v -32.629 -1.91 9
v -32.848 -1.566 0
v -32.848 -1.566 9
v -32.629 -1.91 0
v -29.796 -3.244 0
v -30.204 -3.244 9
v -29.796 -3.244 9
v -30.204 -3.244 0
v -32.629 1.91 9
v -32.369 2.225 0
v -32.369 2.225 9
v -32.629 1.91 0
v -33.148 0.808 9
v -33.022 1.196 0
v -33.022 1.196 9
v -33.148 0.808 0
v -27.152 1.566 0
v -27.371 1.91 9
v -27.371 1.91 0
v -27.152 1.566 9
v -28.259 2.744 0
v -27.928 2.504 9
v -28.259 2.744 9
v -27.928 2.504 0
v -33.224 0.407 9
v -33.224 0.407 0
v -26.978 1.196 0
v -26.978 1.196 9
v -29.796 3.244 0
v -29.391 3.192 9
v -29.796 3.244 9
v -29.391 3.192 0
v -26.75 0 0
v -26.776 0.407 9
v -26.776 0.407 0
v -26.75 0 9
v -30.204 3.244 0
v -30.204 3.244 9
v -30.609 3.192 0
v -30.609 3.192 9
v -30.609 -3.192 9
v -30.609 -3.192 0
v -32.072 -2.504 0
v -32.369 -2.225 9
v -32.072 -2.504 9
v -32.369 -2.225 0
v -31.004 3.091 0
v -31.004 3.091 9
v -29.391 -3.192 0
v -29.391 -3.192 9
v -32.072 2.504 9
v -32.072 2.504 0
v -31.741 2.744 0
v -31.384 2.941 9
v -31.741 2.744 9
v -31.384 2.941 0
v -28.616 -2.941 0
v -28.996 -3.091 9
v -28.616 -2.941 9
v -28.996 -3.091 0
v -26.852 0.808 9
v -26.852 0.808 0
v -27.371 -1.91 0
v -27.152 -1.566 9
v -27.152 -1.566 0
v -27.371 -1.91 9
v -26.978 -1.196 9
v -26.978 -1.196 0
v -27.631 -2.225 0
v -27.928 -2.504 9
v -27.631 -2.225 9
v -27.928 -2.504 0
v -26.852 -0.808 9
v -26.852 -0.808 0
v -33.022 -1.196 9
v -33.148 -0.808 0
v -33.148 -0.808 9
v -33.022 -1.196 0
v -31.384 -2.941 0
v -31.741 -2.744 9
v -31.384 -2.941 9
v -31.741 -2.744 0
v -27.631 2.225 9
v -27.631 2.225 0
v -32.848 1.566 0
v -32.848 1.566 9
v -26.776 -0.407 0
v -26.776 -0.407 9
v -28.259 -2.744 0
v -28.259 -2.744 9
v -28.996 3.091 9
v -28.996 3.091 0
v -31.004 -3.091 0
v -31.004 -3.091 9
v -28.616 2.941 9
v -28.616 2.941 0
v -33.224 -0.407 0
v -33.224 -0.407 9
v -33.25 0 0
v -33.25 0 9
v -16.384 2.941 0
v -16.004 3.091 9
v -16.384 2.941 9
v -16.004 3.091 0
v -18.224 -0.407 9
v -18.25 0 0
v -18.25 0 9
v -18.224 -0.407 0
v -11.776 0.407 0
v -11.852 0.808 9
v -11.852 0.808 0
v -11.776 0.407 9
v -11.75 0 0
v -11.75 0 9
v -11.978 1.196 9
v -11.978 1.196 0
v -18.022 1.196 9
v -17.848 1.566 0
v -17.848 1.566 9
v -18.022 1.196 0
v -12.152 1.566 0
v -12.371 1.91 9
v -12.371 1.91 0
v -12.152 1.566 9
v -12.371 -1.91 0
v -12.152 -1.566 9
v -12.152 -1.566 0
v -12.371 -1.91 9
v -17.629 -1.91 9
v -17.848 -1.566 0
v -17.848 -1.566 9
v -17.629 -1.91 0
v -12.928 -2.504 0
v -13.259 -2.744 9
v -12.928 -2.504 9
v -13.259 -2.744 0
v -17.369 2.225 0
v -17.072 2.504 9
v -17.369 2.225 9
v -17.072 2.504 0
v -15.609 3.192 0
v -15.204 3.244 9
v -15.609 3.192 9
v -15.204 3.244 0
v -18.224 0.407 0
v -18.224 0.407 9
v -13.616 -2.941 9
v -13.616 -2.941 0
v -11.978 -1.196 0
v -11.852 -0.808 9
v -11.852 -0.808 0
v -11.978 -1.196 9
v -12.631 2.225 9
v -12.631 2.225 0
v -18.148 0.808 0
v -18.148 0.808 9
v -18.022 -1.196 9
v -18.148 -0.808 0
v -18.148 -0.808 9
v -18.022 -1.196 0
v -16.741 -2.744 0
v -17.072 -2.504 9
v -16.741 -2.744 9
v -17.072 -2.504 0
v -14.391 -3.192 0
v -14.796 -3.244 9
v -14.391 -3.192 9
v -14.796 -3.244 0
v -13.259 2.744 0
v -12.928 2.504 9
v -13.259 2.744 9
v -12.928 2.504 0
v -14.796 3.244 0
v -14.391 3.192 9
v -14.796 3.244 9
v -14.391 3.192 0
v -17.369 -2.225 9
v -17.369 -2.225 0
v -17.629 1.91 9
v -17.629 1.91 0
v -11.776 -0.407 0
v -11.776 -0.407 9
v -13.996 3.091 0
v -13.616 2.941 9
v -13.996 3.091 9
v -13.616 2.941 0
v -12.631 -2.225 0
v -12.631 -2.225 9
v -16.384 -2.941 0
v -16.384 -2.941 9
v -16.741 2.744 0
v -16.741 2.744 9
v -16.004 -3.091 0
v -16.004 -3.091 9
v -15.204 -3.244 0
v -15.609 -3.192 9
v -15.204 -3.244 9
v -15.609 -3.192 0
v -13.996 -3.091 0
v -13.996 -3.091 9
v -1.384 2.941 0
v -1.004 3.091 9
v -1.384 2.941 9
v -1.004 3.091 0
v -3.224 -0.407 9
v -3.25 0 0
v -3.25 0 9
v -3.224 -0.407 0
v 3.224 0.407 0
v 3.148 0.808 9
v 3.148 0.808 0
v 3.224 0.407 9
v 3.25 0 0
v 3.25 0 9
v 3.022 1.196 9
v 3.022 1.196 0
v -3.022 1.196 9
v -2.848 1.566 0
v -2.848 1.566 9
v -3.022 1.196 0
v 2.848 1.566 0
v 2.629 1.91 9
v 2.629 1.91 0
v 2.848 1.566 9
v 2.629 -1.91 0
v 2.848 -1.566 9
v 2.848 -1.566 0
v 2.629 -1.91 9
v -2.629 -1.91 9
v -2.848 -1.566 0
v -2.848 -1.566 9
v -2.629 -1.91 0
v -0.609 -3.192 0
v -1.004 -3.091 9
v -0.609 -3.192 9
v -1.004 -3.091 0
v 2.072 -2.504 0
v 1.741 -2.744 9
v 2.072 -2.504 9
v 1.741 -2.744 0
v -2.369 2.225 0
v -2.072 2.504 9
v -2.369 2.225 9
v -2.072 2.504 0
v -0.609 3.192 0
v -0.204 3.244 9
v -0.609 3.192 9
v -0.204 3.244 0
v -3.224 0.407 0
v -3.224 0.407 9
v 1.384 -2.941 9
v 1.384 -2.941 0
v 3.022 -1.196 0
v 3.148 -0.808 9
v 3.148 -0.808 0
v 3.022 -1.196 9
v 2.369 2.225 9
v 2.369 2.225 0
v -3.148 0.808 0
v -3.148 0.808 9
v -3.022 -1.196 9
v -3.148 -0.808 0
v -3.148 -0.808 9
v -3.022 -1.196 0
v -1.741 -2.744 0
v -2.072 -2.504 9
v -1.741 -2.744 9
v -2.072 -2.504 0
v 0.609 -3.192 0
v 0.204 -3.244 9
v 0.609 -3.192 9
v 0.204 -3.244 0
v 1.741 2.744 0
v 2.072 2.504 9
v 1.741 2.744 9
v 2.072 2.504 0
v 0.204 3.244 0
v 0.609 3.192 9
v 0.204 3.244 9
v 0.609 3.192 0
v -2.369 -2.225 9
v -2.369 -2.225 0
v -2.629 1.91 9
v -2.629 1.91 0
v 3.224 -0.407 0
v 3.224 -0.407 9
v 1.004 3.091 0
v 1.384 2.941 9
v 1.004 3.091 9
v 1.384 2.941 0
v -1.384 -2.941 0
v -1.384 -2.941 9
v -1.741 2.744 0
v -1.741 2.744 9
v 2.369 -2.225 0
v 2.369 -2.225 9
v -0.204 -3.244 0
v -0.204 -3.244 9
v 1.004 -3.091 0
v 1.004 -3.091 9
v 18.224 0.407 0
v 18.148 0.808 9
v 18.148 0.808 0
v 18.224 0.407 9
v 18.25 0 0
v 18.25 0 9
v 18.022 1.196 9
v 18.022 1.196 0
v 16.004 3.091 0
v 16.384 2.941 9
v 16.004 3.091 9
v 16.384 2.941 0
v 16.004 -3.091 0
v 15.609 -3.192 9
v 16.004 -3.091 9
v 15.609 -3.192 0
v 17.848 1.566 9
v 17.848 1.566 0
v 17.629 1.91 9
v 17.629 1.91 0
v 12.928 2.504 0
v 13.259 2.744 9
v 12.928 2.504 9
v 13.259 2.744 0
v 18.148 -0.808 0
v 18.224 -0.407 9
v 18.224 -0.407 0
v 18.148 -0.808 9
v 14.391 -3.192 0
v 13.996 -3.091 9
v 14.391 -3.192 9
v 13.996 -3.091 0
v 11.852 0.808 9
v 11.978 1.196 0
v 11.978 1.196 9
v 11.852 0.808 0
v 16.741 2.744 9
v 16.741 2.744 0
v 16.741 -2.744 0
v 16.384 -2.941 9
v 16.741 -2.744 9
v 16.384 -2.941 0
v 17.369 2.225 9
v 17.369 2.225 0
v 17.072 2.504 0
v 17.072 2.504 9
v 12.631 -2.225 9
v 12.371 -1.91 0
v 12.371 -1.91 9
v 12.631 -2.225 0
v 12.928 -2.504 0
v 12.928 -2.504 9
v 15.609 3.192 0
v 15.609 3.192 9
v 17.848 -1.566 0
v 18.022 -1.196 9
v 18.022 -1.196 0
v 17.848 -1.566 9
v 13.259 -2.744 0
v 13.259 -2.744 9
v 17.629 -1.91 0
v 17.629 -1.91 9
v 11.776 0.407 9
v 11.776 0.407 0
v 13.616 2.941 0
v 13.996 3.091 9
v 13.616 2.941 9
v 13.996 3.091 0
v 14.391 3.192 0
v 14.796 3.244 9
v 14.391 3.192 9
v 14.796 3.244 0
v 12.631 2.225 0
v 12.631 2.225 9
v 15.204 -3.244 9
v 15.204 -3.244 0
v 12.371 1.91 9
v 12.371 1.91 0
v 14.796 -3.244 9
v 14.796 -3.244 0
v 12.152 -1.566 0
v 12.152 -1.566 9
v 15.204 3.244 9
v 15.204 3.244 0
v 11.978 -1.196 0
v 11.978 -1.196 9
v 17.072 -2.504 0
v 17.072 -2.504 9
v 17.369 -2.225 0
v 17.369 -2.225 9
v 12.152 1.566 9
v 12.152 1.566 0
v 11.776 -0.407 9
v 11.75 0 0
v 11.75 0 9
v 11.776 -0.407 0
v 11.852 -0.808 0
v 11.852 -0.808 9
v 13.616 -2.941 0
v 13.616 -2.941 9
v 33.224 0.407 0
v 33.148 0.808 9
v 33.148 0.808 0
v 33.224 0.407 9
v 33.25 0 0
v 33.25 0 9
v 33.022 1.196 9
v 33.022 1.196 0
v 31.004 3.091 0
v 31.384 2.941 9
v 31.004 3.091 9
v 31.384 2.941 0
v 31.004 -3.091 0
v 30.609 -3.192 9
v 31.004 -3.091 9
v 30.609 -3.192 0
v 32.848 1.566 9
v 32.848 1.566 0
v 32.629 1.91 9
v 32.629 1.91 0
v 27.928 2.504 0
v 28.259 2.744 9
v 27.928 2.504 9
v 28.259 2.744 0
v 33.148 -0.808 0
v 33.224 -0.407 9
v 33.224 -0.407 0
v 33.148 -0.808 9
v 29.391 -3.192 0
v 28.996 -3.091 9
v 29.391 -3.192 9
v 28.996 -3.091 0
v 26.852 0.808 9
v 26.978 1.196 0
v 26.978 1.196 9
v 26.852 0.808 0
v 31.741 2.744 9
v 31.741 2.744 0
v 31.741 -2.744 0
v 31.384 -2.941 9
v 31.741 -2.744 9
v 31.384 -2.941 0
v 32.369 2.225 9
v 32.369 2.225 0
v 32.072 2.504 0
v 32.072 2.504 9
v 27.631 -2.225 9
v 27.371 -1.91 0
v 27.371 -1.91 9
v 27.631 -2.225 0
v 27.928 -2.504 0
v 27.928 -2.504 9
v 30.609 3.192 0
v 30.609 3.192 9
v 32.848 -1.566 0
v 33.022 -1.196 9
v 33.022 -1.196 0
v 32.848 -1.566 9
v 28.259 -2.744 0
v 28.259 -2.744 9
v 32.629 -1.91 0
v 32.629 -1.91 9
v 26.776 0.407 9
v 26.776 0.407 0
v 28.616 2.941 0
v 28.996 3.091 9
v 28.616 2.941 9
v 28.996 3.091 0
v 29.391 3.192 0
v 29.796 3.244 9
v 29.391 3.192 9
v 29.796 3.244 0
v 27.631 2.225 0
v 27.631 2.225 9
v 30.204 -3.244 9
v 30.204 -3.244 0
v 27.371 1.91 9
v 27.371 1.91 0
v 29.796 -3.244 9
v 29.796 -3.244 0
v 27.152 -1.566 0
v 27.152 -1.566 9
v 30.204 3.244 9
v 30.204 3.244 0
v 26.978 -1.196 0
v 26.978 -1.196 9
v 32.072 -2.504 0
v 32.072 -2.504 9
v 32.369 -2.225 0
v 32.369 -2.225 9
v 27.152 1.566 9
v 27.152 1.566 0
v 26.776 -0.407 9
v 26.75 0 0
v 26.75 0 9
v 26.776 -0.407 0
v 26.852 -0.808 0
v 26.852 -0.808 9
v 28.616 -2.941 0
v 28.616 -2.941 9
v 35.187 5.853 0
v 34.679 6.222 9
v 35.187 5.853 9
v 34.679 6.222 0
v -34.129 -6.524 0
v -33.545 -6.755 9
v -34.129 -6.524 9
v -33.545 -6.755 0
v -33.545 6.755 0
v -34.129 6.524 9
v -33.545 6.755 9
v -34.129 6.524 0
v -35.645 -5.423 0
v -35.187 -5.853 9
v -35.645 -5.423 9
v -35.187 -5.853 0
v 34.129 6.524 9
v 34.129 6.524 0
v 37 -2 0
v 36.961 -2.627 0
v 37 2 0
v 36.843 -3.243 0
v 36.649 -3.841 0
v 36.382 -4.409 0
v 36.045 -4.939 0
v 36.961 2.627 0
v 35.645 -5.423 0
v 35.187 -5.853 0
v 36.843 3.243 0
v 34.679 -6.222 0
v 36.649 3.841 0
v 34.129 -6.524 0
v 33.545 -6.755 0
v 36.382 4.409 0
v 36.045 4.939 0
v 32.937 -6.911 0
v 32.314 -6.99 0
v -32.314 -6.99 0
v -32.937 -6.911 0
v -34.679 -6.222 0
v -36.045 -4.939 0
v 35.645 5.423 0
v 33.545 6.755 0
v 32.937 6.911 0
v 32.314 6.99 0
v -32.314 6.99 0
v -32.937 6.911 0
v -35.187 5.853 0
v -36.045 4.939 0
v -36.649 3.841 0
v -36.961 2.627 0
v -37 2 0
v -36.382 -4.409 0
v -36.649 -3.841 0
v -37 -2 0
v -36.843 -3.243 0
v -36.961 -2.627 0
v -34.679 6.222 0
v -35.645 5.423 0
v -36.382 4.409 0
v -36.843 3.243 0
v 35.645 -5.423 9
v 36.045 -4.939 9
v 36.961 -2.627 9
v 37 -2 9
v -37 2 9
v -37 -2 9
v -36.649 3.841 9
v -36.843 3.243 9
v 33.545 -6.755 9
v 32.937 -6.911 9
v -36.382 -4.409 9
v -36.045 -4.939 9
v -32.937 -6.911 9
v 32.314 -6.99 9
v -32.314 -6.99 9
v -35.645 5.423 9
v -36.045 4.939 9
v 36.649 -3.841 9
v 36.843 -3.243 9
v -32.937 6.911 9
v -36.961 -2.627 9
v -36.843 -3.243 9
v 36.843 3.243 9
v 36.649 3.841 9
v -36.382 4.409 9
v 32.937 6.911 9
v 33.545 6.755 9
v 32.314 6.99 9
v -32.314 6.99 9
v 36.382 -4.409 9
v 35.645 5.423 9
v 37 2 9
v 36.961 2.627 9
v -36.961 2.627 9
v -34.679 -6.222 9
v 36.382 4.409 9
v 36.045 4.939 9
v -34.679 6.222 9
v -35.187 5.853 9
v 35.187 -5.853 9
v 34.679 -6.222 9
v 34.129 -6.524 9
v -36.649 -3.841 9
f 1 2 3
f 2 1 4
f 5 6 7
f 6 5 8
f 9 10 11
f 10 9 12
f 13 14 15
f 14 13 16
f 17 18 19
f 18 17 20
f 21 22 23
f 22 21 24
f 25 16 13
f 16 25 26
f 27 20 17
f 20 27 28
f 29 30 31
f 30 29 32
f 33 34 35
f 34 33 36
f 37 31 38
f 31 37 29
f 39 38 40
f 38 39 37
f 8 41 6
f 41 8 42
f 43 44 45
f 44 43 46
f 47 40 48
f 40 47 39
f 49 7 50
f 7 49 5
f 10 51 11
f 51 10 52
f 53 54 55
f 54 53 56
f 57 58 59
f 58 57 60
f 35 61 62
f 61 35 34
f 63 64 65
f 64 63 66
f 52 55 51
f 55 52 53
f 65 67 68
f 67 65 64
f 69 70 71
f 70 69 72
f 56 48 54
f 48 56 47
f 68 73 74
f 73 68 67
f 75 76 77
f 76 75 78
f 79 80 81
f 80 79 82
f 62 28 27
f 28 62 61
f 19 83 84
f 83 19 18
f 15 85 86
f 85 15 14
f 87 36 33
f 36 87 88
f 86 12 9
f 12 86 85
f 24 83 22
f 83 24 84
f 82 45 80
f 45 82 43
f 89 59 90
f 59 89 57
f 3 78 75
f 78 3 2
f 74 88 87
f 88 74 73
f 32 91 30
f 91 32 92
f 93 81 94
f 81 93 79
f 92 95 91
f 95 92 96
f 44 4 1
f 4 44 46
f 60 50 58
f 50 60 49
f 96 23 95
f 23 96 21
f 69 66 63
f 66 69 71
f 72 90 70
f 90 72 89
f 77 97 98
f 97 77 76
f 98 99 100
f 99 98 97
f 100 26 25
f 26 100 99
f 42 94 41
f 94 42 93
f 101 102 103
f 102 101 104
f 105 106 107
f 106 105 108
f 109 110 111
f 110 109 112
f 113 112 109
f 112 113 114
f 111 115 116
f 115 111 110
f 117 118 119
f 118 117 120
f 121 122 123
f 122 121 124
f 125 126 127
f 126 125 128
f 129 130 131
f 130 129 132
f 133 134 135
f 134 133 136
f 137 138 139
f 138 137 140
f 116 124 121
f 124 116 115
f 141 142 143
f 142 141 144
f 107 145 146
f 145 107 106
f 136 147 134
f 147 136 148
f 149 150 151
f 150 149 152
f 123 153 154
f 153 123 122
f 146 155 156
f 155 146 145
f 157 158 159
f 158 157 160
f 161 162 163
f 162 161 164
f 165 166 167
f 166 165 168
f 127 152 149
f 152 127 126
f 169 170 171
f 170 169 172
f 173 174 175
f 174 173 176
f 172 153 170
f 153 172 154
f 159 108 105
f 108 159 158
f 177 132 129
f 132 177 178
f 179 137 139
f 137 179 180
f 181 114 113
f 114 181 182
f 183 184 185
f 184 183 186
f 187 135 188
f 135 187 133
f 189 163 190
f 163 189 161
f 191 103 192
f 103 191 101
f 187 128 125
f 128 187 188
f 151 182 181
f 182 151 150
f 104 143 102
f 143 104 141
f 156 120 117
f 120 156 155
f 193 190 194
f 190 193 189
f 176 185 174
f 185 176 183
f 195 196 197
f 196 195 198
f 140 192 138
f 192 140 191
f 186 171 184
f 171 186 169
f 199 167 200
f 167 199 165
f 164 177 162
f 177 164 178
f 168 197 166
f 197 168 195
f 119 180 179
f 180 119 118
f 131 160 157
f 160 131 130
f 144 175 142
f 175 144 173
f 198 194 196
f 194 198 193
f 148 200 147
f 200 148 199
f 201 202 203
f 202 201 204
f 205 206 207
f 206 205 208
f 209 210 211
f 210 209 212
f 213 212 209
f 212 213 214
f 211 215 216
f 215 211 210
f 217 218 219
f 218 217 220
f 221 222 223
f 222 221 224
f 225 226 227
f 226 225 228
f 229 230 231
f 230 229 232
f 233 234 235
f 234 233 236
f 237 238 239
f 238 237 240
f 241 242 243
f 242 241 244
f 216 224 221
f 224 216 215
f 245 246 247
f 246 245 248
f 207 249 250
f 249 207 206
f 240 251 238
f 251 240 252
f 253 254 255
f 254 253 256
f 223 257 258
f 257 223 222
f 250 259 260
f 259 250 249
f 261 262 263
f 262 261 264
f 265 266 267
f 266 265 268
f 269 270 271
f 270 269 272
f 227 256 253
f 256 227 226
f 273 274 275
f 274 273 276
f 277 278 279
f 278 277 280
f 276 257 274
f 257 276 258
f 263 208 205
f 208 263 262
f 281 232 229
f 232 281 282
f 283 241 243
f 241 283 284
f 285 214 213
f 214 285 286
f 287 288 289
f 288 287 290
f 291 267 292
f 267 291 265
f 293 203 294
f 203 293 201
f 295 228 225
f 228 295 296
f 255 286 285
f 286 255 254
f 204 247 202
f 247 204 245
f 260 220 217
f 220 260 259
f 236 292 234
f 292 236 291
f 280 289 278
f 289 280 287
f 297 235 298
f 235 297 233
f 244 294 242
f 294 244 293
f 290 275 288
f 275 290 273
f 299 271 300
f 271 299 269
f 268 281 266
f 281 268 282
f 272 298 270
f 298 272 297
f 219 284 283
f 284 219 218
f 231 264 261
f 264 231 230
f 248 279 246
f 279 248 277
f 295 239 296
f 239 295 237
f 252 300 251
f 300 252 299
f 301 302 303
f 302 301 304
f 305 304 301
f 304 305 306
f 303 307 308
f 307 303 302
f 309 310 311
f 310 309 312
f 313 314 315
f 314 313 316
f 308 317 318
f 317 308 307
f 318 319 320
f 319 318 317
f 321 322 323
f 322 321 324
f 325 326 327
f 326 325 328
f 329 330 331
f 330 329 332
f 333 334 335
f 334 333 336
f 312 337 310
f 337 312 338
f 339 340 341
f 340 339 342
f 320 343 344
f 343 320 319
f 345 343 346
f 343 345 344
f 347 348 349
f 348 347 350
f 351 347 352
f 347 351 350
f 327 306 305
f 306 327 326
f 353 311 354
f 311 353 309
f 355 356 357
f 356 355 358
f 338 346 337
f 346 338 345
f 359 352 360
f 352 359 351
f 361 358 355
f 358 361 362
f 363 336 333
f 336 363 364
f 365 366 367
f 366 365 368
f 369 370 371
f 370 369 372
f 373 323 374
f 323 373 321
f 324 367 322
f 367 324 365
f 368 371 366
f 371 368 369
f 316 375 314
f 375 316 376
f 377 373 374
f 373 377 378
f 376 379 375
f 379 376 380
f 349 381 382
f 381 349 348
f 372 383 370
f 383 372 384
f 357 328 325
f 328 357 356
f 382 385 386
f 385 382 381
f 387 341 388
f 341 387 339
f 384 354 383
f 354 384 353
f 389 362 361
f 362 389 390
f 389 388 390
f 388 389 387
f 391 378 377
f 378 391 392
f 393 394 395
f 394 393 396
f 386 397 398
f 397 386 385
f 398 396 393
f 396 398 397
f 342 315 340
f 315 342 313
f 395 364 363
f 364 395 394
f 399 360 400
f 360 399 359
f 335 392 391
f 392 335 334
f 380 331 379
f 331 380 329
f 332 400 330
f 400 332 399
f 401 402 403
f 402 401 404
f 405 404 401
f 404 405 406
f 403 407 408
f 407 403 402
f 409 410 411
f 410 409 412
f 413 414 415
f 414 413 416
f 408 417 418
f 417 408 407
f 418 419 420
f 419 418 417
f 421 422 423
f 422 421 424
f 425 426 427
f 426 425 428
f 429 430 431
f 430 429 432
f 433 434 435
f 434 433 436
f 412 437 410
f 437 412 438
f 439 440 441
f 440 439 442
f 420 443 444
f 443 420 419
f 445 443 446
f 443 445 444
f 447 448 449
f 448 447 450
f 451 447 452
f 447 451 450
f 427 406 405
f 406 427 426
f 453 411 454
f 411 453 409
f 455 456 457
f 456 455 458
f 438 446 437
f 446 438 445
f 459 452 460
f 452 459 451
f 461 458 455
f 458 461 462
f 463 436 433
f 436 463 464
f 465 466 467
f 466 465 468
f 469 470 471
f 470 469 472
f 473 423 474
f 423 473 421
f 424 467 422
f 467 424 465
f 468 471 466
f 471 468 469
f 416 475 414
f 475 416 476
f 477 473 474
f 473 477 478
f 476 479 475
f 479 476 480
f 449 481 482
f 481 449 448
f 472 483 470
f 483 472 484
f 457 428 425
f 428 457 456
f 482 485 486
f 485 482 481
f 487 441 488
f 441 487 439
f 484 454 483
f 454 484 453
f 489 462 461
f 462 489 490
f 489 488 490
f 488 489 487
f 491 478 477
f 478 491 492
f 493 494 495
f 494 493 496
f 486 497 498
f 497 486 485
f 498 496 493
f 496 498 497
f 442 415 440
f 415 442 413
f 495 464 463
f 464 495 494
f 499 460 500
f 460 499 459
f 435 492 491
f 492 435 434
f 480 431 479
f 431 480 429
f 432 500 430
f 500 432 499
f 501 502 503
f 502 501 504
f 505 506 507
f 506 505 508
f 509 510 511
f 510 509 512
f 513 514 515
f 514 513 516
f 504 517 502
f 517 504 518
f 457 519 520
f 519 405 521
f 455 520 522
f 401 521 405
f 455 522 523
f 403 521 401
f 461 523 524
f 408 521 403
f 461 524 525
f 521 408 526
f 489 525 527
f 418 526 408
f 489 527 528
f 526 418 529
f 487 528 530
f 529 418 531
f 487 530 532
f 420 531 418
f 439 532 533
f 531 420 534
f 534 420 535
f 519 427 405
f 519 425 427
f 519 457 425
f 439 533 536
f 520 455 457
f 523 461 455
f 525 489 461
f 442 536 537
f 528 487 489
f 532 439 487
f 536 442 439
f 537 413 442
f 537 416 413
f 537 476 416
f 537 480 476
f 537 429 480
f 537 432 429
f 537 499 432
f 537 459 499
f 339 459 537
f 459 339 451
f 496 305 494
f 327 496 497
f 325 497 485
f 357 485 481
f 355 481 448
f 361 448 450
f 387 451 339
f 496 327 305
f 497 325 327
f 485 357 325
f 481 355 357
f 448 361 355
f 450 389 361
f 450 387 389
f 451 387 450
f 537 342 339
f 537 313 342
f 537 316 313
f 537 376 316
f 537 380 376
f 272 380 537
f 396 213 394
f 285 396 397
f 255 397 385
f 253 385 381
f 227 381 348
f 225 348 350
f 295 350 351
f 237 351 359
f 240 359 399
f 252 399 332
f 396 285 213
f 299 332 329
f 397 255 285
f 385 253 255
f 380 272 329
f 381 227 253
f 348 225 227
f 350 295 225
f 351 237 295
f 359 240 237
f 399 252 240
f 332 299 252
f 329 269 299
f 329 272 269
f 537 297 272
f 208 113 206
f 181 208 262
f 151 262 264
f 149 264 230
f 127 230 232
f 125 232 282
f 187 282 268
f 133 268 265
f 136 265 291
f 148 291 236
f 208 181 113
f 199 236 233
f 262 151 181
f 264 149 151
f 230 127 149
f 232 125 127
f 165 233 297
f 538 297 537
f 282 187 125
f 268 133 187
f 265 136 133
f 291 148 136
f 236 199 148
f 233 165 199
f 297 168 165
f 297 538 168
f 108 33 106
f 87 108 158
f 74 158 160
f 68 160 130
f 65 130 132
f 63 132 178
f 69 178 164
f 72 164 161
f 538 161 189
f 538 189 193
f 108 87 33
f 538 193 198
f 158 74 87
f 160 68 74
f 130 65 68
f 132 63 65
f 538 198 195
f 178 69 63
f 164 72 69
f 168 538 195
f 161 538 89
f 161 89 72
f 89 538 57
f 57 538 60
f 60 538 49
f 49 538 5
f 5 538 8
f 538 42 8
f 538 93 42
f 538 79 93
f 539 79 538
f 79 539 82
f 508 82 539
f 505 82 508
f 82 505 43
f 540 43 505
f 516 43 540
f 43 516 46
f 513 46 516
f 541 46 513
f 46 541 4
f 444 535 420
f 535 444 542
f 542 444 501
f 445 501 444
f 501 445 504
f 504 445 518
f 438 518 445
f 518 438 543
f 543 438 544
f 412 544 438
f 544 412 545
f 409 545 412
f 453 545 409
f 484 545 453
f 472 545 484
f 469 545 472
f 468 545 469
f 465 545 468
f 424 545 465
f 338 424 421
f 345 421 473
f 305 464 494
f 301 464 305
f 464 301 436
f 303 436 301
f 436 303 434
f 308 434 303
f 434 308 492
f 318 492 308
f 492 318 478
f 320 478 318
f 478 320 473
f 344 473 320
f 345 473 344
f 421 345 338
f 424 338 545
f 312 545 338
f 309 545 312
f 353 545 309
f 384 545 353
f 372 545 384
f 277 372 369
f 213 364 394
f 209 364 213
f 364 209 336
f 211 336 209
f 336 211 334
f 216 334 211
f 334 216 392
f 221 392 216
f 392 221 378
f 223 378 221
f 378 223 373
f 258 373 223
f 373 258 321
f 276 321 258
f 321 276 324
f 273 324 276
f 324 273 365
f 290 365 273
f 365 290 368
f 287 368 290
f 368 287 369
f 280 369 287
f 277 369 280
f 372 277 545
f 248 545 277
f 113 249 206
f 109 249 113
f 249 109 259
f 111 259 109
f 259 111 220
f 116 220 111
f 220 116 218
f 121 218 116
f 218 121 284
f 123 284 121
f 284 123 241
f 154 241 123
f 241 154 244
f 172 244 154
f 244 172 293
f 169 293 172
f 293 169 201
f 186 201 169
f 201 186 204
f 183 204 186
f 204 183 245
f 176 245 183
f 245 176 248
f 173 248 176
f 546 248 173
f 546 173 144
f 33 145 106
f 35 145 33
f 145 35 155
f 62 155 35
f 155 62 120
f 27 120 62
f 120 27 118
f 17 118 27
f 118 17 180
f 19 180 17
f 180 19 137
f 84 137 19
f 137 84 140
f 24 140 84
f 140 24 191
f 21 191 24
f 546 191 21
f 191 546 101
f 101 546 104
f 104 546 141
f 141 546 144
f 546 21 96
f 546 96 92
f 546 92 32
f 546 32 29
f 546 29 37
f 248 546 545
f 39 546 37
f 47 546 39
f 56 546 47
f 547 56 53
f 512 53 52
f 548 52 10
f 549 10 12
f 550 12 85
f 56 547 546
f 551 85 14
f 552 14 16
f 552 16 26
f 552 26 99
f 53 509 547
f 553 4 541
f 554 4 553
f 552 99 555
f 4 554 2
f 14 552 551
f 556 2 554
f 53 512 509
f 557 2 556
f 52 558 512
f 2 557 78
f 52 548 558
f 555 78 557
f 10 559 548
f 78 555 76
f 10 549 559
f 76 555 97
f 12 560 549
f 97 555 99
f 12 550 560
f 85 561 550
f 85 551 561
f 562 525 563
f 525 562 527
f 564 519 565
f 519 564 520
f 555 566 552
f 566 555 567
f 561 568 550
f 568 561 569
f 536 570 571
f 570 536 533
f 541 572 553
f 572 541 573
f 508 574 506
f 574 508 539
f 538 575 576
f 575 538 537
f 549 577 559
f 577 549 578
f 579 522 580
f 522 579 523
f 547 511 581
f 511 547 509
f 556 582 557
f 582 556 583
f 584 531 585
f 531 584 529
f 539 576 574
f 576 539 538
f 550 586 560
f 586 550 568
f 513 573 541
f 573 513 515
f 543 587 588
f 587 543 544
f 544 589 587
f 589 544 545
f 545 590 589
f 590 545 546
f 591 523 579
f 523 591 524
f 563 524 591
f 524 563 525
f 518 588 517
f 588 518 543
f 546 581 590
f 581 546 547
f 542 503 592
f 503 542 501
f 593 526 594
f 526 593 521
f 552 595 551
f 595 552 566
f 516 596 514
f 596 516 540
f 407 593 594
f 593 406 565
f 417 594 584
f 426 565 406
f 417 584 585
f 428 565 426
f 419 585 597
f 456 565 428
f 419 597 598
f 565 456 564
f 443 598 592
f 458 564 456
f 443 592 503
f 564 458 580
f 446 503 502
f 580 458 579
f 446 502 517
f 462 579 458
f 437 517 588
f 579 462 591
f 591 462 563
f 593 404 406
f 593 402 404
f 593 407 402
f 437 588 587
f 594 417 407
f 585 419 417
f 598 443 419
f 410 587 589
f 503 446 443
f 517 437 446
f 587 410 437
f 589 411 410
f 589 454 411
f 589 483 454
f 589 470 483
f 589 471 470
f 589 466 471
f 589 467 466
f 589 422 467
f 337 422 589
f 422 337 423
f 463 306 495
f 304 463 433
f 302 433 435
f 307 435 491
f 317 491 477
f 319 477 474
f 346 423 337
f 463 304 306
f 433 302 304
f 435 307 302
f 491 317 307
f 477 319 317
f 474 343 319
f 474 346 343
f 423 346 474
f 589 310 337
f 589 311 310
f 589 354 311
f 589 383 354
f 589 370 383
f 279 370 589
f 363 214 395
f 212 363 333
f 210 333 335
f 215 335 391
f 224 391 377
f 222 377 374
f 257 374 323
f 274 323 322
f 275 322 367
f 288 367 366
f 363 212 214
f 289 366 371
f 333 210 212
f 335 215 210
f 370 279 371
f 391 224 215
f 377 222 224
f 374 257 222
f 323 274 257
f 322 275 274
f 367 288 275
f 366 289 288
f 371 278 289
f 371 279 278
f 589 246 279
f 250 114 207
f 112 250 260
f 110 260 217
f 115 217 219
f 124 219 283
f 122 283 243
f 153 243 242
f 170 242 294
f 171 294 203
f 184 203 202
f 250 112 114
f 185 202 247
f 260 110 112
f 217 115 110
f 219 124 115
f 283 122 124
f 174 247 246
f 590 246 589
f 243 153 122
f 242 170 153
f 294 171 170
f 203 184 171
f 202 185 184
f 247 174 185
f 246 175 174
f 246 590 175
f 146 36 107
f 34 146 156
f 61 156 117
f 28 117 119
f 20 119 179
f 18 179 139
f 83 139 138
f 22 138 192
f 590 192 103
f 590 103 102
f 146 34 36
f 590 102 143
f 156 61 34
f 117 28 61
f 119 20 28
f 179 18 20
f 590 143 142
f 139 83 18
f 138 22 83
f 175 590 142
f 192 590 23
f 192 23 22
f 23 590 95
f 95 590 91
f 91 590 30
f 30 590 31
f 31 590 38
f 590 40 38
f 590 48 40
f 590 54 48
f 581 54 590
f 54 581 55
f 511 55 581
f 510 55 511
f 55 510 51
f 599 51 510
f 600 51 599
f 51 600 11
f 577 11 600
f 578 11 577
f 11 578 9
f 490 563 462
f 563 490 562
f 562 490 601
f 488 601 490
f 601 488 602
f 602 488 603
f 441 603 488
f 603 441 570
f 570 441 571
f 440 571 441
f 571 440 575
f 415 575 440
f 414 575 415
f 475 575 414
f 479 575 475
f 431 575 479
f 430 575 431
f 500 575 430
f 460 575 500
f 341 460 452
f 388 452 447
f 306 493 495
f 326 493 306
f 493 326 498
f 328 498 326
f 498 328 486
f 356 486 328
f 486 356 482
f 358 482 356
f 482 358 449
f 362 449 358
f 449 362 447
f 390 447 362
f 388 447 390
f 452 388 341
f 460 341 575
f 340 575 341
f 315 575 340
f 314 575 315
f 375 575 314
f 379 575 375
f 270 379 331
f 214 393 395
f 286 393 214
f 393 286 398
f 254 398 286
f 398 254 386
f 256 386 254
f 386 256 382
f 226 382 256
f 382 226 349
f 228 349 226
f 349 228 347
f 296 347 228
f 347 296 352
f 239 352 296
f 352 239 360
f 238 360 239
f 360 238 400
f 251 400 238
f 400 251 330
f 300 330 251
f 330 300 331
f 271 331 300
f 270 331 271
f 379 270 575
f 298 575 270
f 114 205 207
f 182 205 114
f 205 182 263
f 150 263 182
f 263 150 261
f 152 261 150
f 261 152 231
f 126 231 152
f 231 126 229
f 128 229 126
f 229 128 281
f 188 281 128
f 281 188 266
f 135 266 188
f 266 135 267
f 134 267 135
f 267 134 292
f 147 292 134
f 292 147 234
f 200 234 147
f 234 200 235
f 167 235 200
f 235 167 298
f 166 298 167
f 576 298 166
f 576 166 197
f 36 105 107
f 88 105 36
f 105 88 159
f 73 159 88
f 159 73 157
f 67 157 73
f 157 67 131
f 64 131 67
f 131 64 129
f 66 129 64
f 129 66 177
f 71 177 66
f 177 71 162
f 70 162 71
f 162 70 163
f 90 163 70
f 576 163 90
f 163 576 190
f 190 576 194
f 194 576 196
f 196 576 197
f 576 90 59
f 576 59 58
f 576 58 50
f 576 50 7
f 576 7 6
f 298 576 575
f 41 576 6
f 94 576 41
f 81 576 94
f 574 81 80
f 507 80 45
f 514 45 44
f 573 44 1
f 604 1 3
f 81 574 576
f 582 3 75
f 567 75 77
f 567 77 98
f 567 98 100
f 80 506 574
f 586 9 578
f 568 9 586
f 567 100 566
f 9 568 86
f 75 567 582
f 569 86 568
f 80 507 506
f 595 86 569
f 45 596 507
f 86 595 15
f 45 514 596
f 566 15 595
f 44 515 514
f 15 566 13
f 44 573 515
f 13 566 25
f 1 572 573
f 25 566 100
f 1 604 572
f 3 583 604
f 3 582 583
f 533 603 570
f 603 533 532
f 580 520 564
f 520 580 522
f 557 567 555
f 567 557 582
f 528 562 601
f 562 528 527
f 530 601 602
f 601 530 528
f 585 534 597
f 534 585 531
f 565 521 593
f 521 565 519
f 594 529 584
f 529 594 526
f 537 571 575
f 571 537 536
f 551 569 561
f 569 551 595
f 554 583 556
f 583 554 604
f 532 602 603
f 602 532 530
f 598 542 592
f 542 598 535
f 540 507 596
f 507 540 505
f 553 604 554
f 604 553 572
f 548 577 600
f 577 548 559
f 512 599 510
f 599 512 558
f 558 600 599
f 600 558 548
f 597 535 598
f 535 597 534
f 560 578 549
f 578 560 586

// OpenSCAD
$fn = 50;


difference() {
	union() {
		hull() {
			translate(v = [-32.0000000000, 2.0000000000, 0]) {
				cylinder(h = 9, r = 5);
			}
			translate(v = [32.0000000000, 2.0000000000, 0]) {
				cylinder(h = 9, r = 5);
			}
			translate(v = [-32.0000000000, -2.0000000000, 0]) {
				cylinder(h = 9, r = 5);
			}
			translate(v = [32.0000000000, -2.0000000000, 0]) {
				cylinder(h = 9, r = 5);
			}
		}
	}
	union() {
		translate(v = [-30.0000000000, 0.0000000000, 0]) {
			translate(v = [0, 0, -100]) {
				cylinder(h = 200, r = 3.2500000000);
			}
		}
		translate(v = [-15.0000000000, 0.0000000000, 0]) {
			translate(v = [0, 0, -100]) {
				cylinder(h = 200, r = 3.2500000000);
			}
		}
		translate(v = [0, 0, -100]) {
			cylinder(h = 200, r = 3.2500000000);
		}
		translate(v = [15.0000000000, 0.0000000000, 0]) {
			translate(v = [0, 0, -100]) {
				cylinder(h = 200, r = 3.2500000000);
			}
		}
		translate(v = [30.0000000000, 0.0000000000, 0]) {
			translate(v = [0, 0, -100]) {
				cylinder(h = 200, r = 3.2500000000);
			}
		}
	}
}
